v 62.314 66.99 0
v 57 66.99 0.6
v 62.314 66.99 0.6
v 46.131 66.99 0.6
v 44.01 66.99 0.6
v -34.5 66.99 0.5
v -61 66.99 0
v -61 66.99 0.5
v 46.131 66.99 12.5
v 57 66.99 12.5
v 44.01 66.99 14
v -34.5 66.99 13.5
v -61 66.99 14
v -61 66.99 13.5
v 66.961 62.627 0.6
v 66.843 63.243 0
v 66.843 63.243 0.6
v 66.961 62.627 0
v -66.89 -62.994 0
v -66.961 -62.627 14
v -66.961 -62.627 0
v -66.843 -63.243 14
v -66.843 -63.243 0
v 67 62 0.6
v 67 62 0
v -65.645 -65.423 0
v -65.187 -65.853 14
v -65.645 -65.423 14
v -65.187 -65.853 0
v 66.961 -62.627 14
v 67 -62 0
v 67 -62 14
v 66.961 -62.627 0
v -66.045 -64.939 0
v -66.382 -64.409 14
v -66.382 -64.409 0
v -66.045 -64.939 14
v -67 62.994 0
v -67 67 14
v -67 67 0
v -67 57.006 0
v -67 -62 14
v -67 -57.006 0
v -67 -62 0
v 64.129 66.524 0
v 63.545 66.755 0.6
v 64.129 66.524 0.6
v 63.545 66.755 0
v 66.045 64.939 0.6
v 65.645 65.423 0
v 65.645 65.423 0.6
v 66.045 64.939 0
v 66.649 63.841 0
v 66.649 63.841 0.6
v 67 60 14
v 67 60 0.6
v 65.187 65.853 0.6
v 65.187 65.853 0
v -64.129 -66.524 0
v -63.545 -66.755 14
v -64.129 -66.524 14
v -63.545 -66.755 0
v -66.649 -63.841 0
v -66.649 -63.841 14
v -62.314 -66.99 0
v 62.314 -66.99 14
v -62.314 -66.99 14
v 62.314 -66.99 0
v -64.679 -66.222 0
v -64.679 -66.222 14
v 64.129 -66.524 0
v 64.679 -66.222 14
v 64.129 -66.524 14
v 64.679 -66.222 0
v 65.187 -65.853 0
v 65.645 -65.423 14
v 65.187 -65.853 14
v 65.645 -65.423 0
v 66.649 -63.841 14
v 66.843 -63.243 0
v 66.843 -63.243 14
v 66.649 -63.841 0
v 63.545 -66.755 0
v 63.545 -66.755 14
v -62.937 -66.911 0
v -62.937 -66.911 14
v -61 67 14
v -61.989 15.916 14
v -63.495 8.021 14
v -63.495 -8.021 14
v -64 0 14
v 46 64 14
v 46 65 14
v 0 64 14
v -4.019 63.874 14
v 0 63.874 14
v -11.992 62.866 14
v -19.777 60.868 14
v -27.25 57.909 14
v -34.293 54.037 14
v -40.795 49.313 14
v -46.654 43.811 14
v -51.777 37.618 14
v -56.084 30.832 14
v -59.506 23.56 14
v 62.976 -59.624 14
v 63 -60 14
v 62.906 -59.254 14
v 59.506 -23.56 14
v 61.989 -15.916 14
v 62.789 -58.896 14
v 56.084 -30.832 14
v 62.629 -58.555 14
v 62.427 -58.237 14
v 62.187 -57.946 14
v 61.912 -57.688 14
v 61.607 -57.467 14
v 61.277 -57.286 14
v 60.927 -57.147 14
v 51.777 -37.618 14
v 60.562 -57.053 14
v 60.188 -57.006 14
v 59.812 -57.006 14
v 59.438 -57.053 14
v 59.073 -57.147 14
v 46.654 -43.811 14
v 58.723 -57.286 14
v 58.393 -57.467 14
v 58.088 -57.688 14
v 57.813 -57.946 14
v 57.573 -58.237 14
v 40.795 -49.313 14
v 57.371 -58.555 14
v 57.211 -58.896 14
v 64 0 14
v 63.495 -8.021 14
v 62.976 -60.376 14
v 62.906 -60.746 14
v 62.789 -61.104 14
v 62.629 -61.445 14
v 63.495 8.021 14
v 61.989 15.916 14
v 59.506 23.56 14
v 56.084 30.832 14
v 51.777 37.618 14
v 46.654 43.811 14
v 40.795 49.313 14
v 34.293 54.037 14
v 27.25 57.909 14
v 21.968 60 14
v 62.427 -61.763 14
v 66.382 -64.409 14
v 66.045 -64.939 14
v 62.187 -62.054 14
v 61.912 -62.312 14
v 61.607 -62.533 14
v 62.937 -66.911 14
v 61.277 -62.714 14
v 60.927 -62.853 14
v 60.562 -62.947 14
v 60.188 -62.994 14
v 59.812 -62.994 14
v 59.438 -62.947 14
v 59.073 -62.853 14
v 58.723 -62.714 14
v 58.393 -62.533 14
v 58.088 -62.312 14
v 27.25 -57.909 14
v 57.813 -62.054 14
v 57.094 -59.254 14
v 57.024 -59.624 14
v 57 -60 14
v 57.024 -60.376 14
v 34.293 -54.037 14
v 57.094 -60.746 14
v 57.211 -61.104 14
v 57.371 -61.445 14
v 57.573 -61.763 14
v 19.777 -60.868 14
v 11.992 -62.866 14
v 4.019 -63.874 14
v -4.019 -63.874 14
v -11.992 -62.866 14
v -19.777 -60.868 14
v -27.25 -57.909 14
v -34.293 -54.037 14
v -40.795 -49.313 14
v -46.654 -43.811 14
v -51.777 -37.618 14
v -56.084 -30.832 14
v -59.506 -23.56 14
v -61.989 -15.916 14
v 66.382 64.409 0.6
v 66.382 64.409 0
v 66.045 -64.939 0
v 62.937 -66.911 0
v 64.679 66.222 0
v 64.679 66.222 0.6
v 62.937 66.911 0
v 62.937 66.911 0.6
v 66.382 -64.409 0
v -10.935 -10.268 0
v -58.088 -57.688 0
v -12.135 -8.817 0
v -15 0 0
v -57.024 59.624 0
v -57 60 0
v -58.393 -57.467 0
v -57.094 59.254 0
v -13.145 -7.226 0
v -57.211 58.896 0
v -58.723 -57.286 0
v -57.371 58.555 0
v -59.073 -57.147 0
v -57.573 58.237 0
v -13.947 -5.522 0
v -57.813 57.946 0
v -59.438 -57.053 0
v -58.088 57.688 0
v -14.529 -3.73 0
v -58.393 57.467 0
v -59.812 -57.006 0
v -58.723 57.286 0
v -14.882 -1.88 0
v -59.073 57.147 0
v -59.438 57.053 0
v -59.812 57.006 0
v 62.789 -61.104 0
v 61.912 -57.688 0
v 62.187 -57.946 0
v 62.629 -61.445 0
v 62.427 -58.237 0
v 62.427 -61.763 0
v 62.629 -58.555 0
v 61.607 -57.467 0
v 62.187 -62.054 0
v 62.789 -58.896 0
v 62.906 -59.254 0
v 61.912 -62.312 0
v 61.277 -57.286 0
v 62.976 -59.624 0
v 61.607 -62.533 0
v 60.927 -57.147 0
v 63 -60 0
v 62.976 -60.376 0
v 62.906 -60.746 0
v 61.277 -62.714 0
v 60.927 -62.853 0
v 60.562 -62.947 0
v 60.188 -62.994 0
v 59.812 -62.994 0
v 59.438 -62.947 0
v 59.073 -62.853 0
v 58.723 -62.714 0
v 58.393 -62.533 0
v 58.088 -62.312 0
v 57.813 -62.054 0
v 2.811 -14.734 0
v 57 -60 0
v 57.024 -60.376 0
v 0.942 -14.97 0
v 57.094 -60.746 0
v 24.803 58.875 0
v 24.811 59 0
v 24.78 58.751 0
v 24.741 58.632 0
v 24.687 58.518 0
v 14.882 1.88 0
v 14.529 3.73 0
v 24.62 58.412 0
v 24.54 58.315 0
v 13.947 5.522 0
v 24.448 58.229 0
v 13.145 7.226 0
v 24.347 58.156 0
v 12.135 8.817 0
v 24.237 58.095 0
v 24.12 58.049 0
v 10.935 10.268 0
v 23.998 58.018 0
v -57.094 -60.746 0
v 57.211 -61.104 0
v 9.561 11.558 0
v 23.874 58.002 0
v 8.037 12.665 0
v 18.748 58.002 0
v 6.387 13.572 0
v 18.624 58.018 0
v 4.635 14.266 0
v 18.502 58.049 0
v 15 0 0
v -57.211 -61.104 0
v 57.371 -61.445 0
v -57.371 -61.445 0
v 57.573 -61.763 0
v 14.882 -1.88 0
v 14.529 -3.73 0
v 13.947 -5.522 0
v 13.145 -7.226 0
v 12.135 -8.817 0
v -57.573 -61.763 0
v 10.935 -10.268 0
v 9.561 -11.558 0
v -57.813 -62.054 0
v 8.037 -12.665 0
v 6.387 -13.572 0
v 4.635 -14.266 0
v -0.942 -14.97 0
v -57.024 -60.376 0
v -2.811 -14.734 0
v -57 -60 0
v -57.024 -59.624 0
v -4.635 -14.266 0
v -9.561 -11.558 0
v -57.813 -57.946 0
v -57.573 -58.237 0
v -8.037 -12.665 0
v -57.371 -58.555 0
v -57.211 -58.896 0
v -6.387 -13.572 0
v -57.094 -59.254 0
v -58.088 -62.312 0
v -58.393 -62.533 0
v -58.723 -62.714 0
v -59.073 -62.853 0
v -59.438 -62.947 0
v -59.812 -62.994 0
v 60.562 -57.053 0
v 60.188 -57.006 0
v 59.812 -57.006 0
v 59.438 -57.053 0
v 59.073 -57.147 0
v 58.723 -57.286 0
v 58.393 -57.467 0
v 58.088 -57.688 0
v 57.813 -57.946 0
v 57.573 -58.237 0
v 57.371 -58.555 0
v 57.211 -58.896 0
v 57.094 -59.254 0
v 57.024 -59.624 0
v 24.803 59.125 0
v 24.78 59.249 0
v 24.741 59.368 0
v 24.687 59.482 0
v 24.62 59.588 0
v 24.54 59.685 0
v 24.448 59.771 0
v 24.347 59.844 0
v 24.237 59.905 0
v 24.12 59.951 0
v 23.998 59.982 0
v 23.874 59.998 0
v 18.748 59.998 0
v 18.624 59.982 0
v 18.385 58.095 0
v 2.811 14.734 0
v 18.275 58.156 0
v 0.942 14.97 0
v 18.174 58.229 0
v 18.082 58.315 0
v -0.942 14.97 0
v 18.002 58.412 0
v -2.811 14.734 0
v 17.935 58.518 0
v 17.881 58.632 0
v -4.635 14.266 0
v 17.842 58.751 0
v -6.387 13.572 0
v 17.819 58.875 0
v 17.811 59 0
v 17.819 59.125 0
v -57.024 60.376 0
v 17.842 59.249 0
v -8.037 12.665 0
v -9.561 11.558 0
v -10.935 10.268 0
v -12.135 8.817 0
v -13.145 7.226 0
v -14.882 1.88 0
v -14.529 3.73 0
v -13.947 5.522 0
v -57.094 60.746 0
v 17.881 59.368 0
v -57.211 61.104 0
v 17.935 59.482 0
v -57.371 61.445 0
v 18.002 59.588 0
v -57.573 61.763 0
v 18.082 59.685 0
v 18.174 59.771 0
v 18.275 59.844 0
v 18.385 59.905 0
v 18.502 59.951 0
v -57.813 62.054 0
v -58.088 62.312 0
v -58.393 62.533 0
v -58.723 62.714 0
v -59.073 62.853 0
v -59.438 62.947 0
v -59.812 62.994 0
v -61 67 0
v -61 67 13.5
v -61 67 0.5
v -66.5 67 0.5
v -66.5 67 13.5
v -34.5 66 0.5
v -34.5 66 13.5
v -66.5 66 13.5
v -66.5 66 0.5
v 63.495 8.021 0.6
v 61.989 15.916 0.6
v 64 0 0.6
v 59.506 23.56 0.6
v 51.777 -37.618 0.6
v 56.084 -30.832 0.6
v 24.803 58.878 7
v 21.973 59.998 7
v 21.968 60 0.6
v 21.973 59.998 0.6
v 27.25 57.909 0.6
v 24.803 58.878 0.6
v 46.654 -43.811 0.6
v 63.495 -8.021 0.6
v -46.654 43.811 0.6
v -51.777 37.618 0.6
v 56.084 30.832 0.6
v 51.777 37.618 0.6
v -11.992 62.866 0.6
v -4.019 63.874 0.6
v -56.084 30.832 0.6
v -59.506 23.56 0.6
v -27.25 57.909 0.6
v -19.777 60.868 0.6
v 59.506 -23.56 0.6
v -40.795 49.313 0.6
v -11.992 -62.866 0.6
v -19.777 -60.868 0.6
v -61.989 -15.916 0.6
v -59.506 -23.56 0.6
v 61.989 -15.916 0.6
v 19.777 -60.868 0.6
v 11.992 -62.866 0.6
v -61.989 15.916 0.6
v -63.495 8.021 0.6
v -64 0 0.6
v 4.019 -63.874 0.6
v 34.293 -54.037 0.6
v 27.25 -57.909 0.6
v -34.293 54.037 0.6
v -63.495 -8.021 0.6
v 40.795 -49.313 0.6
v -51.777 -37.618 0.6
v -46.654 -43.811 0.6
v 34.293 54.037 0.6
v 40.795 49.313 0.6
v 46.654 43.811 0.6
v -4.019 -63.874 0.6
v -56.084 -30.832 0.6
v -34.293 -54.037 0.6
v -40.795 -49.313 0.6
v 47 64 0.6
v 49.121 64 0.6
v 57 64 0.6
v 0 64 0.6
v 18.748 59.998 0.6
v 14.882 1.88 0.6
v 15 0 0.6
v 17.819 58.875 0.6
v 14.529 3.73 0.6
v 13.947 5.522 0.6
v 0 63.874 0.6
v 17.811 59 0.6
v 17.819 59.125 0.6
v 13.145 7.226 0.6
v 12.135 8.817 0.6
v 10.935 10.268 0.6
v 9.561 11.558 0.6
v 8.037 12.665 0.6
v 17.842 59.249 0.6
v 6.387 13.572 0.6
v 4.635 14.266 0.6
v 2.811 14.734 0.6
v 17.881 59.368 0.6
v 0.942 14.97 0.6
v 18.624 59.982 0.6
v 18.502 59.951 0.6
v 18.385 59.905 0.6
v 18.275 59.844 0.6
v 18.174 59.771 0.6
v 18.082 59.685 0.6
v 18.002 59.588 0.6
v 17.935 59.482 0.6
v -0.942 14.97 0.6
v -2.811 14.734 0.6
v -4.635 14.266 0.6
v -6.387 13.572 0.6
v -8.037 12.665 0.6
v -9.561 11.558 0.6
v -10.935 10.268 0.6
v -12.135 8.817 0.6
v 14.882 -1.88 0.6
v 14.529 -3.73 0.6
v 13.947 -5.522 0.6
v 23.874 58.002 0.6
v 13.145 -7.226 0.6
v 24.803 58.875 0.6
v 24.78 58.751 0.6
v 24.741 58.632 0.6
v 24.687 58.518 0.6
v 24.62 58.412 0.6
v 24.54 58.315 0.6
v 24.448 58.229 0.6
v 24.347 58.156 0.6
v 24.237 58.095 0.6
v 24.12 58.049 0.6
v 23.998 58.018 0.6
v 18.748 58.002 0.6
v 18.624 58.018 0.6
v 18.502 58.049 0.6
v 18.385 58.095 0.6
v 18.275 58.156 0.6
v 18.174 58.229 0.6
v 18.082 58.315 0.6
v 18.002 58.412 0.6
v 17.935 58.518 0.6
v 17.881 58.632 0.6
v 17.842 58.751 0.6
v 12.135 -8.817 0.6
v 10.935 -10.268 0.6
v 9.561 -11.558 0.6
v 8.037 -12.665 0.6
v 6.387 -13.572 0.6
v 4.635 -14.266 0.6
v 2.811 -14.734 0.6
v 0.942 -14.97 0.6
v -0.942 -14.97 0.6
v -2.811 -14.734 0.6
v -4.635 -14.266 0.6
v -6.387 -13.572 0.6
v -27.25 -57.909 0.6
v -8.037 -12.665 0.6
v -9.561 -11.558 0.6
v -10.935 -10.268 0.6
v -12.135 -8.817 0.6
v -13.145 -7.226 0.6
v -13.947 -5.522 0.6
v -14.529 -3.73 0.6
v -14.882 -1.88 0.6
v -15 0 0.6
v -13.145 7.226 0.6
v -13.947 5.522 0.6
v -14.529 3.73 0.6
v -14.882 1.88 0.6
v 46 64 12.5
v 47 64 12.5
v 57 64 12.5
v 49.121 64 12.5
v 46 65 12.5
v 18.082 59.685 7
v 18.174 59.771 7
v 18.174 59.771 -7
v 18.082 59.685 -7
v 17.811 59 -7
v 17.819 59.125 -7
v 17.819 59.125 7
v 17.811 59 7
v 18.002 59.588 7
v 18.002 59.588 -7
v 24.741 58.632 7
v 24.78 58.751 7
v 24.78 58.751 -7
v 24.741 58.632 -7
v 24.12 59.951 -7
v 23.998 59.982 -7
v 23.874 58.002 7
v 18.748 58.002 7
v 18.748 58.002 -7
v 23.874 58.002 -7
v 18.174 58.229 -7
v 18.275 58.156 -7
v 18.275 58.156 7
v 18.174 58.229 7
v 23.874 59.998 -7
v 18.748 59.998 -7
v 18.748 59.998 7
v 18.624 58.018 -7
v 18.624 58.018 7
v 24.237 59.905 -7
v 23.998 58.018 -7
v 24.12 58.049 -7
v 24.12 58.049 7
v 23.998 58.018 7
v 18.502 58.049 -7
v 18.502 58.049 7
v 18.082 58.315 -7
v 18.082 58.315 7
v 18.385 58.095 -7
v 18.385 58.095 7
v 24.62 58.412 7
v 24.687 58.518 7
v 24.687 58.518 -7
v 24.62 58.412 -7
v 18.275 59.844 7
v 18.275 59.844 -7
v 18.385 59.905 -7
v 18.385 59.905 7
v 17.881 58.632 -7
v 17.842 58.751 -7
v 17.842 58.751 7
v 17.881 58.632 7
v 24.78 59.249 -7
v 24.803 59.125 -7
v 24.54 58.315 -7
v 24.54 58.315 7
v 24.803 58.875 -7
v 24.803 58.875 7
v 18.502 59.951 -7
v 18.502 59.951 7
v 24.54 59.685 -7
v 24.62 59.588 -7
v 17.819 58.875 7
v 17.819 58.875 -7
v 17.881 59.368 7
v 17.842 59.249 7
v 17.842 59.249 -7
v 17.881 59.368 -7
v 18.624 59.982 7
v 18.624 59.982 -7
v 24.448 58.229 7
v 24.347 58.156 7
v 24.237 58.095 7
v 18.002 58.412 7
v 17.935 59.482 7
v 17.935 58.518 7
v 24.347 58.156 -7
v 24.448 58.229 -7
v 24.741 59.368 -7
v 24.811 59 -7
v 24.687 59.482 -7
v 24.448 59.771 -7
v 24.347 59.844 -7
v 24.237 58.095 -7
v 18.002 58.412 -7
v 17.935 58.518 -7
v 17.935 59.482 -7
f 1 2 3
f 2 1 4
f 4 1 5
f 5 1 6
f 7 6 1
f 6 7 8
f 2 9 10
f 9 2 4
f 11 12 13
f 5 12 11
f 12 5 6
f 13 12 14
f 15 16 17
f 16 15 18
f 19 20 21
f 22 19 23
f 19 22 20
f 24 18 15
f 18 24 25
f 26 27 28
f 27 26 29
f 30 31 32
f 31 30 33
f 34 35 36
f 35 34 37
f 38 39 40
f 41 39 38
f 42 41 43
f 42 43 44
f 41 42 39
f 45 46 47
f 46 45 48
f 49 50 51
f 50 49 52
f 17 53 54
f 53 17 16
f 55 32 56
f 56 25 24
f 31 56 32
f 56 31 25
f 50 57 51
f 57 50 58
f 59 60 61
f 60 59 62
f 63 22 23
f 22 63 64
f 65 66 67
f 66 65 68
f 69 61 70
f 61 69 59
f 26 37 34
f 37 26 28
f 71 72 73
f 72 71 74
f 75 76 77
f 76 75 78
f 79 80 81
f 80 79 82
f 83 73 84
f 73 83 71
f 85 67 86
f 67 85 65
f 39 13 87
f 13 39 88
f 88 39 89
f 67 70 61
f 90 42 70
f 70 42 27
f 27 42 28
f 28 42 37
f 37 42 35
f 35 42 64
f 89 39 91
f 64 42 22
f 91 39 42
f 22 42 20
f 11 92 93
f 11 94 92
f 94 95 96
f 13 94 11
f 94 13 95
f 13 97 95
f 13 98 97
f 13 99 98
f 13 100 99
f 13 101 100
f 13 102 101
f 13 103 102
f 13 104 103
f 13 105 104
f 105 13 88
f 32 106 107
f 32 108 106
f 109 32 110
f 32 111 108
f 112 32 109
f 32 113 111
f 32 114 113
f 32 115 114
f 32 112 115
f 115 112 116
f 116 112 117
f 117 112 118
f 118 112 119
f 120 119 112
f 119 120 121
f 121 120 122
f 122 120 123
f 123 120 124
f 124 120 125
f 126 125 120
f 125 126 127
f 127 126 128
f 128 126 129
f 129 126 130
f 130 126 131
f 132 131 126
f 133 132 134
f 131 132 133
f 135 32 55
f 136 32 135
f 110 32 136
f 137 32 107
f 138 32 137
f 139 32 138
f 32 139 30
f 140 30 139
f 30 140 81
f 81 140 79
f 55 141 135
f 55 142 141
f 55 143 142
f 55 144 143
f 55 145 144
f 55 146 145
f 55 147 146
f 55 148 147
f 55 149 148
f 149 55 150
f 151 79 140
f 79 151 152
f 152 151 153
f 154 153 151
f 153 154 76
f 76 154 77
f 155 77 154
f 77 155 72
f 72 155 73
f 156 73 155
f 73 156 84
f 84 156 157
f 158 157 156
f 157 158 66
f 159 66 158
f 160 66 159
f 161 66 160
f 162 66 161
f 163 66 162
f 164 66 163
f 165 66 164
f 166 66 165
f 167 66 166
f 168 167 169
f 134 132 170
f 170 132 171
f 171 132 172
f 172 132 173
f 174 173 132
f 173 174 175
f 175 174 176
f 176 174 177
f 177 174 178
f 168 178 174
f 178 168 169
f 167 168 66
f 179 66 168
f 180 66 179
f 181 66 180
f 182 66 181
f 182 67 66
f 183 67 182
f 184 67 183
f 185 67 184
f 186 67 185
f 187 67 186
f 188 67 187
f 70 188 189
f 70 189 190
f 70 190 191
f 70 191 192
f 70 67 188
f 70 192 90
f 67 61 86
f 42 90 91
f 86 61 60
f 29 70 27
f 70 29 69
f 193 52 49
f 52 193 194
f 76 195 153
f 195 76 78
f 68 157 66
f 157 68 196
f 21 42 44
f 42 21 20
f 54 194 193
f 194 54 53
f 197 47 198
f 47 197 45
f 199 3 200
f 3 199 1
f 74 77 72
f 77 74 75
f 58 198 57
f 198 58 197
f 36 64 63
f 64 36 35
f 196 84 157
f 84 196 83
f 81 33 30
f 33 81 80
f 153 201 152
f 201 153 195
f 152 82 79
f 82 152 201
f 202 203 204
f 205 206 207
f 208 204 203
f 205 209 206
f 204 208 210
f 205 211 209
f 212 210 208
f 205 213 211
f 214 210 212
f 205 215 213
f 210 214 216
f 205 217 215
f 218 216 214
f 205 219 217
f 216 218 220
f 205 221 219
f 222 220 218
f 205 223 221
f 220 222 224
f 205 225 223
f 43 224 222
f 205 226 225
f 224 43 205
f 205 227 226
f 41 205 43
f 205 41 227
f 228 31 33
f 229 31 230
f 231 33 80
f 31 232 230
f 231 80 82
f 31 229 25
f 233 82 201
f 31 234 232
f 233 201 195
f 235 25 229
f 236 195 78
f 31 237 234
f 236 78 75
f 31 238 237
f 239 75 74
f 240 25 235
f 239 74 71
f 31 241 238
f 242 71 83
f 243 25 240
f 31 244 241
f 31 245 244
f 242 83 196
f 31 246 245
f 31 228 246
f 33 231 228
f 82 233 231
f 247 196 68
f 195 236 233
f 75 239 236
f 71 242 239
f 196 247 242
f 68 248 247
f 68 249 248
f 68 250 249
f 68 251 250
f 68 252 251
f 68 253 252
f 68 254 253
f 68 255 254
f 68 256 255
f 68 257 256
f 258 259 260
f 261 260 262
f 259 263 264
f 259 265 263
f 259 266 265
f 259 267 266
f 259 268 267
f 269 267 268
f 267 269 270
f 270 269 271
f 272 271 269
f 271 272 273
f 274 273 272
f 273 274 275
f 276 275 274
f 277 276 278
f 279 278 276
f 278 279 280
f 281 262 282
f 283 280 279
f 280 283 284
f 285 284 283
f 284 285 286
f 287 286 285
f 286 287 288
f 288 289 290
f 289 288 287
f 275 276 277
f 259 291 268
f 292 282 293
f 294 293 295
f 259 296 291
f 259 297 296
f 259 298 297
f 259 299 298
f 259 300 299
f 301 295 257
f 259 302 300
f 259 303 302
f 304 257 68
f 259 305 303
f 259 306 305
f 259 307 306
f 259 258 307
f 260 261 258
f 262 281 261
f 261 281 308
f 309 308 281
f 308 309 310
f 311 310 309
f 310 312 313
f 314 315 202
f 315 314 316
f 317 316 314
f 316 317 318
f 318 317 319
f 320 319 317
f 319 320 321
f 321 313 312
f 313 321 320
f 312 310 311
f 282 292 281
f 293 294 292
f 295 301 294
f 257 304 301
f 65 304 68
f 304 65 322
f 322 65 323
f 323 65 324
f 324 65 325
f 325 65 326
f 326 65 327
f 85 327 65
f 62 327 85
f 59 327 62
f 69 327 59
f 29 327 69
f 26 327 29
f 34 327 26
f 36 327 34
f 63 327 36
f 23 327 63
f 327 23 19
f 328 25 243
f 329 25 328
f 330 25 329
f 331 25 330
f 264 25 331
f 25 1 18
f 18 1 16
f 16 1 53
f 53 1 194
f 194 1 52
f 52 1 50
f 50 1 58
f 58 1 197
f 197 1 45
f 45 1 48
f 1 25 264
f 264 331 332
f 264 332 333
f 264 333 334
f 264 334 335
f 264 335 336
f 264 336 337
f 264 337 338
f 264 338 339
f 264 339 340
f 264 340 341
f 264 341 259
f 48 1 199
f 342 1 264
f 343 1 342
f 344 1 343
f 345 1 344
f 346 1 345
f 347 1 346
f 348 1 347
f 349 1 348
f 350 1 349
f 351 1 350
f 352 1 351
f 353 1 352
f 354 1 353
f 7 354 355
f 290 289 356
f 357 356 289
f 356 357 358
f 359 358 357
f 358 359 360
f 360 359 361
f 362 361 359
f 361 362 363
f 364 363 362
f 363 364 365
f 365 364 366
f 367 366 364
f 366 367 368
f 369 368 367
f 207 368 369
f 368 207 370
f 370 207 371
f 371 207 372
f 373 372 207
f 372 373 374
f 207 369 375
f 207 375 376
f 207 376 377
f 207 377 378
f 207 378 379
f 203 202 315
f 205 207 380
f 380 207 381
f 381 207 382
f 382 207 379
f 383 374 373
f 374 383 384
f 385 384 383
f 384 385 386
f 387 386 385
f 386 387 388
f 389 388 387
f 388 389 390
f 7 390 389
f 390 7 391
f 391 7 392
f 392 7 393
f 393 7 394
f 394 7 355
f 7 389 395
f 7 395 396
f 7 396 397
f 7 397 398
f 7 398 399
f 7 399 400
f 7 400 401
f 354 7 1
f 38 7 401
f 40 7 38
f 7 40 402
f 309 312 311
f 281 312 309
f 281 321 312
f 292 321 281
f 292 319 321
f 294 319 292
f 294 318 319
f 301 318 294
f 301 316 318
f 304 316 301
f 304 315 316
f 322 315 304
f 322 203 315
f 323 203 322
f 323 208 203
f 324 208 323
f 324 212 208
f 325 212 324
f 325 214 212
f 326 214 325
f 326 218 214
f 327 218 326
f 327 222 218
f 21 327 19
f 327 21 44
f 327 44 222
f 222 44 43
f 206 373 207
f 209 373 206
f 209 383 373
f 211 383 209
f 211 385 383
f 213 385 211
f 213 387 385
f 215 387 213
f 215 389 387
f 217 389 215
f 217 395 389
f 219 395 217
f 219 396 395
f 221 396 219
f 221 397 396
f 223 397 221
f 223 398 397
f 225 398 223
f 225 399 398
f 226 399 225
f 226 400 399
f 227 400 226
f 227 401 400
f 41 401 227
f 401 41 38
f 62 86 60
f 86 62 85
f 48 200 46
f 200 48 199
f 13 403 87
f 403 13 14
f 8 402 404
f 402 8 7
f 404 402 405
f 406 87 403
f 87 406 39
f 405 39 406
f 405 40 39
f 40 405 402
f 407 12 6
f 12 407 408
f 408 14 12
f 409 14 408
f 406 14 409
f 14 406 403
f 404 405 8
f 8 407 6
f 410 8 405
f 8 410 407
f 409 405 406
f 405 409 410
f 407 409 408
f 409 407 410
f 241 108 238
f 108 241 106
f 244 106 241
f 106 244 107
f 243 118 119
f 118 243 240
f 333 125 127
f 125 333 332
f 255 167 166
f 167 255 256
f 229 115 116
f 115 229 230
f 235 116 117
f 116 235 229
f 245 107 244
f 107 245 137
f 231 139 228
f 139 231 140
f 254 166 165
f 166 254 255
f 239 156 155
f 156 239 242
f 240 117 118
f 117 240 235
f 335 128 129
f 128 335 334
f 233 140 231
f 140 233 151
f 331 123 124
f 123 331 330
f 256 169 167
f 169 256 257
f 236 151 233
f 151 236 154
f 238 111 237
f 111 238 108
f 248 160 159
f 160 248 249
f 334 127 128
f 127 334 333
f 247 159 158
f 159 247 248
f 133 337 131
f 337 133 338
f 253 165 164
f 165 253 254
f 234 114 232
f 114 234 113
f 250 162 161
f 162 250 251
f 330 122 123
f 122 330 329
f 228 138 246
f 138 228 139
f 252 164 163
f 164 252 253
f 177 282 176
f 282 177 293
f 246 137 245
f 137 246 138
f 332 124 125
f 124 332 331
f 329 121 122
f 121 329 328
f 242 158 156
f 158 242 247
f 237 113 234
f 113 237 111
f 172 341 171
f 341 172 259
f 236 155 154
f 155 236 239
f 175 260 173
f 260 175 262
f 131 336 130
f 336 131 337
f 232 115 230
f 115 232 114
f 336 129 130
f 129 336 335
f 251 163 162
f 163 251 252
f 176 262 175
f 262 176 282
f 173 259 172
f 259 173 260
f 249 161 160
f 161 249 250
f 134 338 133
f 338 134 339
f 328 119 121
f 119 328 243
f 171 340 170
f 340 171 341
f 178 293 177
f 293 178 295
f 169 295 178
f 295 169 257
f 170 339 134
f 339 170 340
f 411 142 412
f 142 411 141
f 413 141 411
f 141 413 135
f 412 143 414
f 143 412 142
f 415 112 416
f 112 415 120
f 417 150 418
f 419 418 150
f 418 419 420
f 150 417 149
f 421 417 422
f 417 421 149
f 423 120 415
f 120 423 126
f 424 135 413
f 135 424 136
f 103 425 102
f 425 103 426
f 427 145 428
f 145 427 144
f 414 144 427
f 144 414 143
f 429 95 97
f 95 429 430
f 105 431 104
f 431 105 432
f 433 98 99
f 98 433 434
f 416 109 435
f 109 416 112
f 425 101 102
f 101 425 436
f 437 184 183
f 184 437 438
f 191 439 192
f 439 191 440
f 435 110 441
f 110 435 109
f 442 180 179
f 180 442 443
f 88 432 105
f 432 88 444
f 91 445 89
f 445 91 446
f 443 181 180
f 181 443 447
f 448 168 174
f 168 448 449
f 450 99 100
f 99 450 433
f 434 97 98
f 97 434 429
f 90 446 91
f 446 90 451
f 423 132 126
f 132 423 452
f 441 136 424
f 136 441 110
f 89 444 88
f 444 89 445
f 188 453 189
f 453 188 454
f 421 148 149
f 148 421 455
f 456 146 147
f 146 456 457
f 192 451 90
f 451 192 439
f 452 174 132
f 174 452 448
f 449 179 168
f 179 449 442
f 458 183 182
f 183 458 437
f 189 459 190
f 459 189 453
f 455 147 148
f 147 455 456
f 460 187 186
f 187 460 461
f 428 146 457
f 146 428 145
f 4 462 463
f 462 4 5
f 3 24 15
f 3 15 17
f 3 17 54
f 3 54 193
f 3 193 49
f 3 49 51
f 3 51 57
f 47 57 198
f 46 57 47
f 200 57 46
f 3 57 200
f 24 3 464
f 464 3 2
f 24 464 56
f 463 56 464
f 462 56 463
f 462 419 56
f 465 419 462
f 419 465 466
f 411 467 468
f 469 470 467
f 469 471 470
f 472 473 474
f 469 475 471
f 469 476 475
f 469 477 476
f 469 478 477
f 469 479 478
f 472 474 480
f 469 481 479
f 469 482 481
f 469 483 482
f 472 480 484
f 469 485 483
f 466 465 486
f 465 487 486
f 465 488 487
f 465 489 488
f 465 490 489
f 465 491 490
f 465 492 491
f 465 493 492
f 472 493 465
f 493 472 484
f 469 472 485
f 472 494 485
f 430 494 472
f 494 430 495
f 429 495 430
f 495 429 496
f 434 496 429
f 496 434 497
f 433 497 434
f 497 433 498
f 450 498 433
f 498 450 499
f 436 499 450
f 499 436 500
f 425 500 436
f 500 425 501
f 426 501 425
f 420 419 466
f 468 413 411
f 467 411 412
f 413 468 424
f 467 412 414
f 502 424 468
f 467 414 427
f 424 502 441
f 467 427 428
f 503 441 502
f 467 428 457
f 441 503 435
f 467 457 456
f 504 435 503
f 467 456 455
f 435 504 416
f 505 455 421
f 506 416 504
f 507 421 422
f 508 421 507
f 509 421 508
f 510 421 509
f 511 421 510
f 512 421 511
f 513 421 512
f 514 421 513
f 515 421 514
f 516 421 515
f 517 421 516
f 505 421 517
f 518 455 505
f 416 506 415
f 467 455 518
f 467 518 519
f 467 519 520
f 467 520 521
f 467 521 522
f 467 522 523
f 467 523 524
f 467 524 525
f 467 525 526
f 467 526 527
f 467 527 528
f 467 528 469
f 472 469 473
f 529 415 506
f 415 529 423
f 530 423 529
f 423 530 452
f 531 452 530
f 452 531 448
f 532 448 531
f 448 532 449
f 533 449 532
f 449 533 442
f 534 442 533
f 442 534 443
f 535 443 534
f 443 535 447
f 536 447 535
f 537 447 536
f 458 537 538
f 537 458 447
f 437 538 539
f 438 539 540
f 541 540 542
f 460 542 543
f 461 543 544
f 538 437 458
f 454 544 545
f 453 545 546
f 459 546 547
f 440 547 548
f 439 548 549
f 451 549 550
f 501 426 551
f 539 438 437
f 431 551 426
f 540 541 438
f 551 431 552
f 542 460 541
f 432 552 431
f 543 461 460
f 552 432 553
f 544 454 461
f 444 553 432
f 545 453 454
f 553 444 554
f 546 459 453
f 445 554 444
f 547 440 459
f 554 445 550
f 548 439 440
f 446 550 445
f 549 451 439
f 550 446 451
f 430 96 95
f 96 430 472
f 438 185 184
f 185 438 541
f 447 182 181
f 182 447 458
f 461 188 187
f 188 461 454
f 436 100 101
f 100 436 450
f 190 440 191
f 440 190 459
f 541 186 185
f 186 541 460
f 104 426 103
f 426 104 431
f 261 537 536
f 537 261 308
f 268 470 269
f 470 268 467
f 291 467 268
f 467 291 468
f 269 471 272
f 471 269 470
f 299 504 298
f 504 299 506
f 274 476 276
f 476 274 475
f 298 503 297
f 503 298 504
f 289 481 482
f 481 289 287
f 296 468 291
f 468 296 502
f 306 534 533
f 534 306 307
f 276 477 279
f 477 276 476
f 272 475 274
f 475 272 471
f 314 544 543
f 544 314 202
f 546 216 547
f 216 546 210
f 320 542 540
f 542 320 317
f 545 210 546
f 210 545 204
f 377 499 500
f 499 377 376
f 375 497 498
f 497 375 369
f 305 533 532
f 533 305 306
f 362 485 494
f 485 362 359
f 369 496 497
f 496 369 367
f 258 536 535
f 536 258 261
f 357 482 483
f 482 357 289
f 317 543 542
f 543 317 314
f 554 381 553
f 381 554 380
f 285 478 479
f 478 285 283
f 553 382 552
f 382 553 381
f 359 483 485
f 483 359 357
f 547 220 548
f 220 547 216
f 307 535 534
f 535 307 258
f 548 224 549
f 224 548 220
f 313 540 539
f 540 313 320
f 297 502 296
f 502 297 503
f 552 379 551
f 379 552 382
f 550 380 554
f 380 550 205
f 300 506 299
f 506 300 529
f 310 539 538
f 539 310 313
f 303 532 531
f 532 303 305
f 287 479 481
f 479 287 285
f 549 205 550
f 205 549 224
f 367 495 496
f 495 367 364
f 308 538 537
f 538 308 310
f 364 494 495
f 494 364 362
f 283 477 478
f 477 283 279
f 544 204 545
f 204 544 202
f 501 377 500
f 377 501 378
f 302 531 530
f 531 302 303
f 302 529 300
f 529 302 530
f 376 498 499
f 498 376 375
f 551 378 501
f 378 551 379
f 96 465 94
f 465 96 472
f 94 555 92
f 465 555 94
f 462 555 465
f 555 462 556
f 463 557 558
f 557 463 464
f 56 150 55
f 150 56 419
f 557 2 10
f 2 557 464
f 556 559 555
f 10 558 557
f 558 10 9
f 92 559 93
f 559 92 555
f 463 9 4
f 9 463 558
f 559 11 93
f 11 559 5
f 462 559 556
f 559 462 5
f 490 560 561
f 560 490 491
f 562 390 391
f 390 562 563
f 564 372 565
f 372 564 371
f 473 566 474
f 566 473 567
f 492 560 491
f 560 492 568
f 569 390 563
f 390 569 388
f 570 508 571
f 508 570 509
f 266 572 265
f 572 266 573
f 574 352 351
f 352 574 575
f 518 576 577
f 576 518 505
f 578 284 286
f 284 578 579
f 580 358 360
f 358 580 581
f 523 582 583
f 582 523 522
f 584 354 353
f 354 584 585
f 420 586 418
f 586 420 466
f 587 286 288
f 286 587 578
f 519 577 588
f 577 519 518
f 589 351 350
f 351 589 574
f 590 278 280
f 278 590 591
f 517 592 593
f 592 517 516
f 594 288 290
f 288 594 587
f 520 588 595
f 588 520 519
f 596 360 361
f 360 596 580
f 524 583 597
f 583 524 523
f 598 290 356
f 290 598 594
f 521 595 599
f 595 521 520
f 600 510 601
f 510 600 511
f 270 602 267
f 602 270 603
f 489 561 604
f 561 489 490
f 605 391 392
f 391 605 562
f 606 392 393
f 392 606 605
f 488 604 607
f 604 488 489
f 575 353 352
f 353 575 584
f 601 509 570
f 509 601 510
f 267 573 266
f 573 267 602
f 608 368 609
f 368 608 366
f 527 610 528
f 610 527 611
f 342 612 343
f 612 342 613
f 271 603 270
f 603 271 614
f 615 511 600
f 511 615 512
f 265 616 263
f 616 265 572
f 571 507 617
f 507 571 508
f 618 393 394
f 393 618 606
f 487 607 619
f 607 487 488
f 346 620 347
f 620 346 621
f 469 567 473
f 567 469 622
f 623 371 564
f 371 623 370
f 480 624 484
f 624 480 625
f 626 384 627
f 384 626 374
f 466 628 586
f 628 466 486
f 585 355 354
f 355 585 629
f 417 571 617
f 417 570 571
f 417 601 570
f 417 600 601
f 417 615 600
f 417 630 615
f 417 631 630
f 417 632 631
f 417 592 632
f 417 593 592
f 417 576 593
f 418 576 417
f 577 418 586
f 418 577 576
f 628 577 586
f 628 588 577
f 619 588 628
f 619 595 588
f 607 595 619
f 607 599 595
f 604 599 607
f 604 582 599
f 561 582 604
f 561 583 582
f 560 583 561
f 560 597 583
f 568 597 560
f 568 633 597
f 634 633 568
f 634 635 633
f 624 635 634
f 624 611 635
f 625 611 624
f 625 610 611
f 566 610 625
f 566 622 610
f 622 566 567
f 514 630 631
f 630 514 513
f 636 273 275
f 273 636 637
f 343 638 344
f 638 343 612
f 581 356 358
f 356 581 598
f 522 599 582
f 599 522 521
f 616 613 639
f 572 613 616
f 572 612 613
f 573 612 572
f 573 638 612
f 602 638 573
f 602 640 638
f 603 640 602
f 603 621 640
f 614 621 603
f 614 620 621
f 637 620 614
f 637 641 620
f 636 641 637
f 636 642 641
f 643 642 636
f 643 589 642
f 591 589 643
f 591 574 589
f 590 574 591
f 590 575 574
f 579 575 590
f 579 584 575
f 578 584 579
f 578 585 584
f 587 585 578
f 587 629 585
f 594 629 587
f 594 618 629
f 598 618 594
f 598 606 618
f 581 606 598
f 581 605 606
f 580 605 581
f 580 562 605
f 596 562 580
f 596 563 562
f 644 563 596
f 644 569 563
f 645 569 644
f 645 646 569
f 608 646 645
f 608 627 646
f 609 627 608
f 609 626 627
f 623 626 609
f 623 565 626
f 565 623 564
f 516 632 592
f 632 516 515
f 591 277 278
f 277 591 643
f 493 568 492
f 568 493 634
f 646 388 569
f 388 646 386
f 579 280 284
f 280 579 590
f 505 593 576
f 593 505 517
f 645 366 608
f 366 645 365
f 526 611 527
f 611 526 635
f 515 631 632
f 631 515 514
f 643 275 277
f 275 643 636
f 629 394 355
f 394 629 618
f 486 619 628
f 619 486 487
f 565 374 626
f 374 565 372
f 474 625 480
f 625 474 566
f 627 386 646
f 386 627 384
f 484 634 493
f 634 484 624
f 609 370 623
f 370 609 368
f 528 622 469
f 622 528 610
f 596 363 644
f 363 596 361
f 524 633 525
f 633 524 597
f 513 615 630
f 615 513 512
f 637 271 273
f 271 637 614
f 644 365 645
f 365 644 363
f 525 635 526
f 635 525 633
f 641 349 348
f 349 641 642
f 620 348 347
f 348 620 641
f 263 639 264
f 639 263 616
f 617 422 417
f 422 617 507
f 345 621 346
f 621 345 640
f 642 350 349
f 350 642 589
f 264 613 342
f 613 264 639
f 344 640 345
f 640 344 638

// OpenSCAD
$fn = 50;


union() {
	difference() {
		union() {
			hull() {
				translate(v = [-62.0000000000, 62.0000000000, 0]) {
					cylinder(h = 14, r = 5);
				}
				translate(v = [62.0000000000, 62.0000000000, 0]) {
					cylinder(h = 14, r = 5);
				}
				translate(v = [-62.0000000000, -62.0000000000, 0]) {
					cylinder(h = 14, r = 5);
				}
				translate(v = [62.0000000000, -62.0000000000, 0]) {
					cylinder(h = 14, r = 5);
				}
			}
			translate(v = [-67.0000000000, 61.0000000000, 0]) {
				cube(size = [6, 6, 14]);
			}
		}
		union() {
			translate(v = [-67.5000000000, -60.0000000000, -250.0000000000]) {
				rotate(a = [0, 0, 0]) {
					difference() {
						union() {
							hull() {
								translate(v = [7.5000000000, 0, 0]) {
									cylinder(h = 250, r = 3.0000000000, r1 = 3.0000000000, r2 = 3.0000000000);
								}
								translate(v = [-7.5000000000, 0, 0]) {
									cylinder(h = 250, r = 3.0000000000, r1 = 3.0000000000, r2 = 3.0000000000);
								}
							}
						}
						union();
					}
				}
			}
			translate(v = [-67.5000000000, 60.0000000000, -250.0000000000]) {
				rotate(a = [0, 0, 0]) {
					difference() {
						union() {
							hull() {
								translate(v = [7.5000000000, 0, 0]) {
									cylinder(h = 250, r = 3.0000000000, r1 = 3.0000000000, r2 = 3.0000000000);
								}
								translate(v = [-7.5000000000, 0, 0]) {
									cylinder(h = 250, r = 3.0000000000, r1 = 3.0000000000, r2 = 3.0000000000);
								}
							}
						}
						union();
					}
				}
			}
			translate(v = [-66.5000000000, 66.0000000000, 0.5000000000]) {
				cube(size = [32, 1, 13.0000000000]);
			}
			translate(v = [60.0000000000, -60.0000000000, 0]) {
				cylinder(h = 100, r = 3.0000000000);
			}
			translate(v = [0, 0, 0.6000000000]) {
				cylinder(h = 16.4000000000, r = 64.0000000000);
			}
			translate(v = [0, 0, -7.0000000000]) {
				cylinder(h = 14, r = 15.0000000000);
			}
			translate(v = [0.0000000000, 60.0000000000, 0.6000000000]) {
				cube(size = [67.0000000000, 4, 16.4000000000]);
			}
			translate(v = [57.0000000000, 60.0000000000, 0.6000000000]) {
				cube(size = [10, 7, 16.4000000000]);
			}
			translate(v = [46.0000000000, 60.0000000000, 12.5000000000]) {
				cube(size = [21, 7, 1.5000000000]);
			}
			translate(v = [43.2500000000, 67.7500000000, 0.6000000000]) {
				rotate(a = [0, 0, -45]) {
					cube(size = [7.5000000000, 1.5000000000, 16.4000000000]);
				}
			}
			translate(v = [12.0610000000, 58.0000000000, 0.6000000000]) {
				cube(size = [7.5000000000, 2, 13.4000000000]);
			}
		}
	}
	union() {
		translate(v = [21.3110000000, 59.0000000000, -7.0000000000]) {
			rotate(a = [0, 0, 0]) {
				difference() {
					union() {
						#hull() {
							#translate(v = [2.5000000000, 0, 0]) {
								cylinder(h = 14, r = 1.0000000000, r1 = 1.0000000000, r2 = 1.0000000000);
							}
							#translate(v = [-2.5000000000, 0, 0]) {
								cylinder(h = 14, r = 1.0000000000, r1 = 1.0000000000, r2 = 1.0000000000);
							}
						}
					}
					union();
				}
			}
		}
	}
}
